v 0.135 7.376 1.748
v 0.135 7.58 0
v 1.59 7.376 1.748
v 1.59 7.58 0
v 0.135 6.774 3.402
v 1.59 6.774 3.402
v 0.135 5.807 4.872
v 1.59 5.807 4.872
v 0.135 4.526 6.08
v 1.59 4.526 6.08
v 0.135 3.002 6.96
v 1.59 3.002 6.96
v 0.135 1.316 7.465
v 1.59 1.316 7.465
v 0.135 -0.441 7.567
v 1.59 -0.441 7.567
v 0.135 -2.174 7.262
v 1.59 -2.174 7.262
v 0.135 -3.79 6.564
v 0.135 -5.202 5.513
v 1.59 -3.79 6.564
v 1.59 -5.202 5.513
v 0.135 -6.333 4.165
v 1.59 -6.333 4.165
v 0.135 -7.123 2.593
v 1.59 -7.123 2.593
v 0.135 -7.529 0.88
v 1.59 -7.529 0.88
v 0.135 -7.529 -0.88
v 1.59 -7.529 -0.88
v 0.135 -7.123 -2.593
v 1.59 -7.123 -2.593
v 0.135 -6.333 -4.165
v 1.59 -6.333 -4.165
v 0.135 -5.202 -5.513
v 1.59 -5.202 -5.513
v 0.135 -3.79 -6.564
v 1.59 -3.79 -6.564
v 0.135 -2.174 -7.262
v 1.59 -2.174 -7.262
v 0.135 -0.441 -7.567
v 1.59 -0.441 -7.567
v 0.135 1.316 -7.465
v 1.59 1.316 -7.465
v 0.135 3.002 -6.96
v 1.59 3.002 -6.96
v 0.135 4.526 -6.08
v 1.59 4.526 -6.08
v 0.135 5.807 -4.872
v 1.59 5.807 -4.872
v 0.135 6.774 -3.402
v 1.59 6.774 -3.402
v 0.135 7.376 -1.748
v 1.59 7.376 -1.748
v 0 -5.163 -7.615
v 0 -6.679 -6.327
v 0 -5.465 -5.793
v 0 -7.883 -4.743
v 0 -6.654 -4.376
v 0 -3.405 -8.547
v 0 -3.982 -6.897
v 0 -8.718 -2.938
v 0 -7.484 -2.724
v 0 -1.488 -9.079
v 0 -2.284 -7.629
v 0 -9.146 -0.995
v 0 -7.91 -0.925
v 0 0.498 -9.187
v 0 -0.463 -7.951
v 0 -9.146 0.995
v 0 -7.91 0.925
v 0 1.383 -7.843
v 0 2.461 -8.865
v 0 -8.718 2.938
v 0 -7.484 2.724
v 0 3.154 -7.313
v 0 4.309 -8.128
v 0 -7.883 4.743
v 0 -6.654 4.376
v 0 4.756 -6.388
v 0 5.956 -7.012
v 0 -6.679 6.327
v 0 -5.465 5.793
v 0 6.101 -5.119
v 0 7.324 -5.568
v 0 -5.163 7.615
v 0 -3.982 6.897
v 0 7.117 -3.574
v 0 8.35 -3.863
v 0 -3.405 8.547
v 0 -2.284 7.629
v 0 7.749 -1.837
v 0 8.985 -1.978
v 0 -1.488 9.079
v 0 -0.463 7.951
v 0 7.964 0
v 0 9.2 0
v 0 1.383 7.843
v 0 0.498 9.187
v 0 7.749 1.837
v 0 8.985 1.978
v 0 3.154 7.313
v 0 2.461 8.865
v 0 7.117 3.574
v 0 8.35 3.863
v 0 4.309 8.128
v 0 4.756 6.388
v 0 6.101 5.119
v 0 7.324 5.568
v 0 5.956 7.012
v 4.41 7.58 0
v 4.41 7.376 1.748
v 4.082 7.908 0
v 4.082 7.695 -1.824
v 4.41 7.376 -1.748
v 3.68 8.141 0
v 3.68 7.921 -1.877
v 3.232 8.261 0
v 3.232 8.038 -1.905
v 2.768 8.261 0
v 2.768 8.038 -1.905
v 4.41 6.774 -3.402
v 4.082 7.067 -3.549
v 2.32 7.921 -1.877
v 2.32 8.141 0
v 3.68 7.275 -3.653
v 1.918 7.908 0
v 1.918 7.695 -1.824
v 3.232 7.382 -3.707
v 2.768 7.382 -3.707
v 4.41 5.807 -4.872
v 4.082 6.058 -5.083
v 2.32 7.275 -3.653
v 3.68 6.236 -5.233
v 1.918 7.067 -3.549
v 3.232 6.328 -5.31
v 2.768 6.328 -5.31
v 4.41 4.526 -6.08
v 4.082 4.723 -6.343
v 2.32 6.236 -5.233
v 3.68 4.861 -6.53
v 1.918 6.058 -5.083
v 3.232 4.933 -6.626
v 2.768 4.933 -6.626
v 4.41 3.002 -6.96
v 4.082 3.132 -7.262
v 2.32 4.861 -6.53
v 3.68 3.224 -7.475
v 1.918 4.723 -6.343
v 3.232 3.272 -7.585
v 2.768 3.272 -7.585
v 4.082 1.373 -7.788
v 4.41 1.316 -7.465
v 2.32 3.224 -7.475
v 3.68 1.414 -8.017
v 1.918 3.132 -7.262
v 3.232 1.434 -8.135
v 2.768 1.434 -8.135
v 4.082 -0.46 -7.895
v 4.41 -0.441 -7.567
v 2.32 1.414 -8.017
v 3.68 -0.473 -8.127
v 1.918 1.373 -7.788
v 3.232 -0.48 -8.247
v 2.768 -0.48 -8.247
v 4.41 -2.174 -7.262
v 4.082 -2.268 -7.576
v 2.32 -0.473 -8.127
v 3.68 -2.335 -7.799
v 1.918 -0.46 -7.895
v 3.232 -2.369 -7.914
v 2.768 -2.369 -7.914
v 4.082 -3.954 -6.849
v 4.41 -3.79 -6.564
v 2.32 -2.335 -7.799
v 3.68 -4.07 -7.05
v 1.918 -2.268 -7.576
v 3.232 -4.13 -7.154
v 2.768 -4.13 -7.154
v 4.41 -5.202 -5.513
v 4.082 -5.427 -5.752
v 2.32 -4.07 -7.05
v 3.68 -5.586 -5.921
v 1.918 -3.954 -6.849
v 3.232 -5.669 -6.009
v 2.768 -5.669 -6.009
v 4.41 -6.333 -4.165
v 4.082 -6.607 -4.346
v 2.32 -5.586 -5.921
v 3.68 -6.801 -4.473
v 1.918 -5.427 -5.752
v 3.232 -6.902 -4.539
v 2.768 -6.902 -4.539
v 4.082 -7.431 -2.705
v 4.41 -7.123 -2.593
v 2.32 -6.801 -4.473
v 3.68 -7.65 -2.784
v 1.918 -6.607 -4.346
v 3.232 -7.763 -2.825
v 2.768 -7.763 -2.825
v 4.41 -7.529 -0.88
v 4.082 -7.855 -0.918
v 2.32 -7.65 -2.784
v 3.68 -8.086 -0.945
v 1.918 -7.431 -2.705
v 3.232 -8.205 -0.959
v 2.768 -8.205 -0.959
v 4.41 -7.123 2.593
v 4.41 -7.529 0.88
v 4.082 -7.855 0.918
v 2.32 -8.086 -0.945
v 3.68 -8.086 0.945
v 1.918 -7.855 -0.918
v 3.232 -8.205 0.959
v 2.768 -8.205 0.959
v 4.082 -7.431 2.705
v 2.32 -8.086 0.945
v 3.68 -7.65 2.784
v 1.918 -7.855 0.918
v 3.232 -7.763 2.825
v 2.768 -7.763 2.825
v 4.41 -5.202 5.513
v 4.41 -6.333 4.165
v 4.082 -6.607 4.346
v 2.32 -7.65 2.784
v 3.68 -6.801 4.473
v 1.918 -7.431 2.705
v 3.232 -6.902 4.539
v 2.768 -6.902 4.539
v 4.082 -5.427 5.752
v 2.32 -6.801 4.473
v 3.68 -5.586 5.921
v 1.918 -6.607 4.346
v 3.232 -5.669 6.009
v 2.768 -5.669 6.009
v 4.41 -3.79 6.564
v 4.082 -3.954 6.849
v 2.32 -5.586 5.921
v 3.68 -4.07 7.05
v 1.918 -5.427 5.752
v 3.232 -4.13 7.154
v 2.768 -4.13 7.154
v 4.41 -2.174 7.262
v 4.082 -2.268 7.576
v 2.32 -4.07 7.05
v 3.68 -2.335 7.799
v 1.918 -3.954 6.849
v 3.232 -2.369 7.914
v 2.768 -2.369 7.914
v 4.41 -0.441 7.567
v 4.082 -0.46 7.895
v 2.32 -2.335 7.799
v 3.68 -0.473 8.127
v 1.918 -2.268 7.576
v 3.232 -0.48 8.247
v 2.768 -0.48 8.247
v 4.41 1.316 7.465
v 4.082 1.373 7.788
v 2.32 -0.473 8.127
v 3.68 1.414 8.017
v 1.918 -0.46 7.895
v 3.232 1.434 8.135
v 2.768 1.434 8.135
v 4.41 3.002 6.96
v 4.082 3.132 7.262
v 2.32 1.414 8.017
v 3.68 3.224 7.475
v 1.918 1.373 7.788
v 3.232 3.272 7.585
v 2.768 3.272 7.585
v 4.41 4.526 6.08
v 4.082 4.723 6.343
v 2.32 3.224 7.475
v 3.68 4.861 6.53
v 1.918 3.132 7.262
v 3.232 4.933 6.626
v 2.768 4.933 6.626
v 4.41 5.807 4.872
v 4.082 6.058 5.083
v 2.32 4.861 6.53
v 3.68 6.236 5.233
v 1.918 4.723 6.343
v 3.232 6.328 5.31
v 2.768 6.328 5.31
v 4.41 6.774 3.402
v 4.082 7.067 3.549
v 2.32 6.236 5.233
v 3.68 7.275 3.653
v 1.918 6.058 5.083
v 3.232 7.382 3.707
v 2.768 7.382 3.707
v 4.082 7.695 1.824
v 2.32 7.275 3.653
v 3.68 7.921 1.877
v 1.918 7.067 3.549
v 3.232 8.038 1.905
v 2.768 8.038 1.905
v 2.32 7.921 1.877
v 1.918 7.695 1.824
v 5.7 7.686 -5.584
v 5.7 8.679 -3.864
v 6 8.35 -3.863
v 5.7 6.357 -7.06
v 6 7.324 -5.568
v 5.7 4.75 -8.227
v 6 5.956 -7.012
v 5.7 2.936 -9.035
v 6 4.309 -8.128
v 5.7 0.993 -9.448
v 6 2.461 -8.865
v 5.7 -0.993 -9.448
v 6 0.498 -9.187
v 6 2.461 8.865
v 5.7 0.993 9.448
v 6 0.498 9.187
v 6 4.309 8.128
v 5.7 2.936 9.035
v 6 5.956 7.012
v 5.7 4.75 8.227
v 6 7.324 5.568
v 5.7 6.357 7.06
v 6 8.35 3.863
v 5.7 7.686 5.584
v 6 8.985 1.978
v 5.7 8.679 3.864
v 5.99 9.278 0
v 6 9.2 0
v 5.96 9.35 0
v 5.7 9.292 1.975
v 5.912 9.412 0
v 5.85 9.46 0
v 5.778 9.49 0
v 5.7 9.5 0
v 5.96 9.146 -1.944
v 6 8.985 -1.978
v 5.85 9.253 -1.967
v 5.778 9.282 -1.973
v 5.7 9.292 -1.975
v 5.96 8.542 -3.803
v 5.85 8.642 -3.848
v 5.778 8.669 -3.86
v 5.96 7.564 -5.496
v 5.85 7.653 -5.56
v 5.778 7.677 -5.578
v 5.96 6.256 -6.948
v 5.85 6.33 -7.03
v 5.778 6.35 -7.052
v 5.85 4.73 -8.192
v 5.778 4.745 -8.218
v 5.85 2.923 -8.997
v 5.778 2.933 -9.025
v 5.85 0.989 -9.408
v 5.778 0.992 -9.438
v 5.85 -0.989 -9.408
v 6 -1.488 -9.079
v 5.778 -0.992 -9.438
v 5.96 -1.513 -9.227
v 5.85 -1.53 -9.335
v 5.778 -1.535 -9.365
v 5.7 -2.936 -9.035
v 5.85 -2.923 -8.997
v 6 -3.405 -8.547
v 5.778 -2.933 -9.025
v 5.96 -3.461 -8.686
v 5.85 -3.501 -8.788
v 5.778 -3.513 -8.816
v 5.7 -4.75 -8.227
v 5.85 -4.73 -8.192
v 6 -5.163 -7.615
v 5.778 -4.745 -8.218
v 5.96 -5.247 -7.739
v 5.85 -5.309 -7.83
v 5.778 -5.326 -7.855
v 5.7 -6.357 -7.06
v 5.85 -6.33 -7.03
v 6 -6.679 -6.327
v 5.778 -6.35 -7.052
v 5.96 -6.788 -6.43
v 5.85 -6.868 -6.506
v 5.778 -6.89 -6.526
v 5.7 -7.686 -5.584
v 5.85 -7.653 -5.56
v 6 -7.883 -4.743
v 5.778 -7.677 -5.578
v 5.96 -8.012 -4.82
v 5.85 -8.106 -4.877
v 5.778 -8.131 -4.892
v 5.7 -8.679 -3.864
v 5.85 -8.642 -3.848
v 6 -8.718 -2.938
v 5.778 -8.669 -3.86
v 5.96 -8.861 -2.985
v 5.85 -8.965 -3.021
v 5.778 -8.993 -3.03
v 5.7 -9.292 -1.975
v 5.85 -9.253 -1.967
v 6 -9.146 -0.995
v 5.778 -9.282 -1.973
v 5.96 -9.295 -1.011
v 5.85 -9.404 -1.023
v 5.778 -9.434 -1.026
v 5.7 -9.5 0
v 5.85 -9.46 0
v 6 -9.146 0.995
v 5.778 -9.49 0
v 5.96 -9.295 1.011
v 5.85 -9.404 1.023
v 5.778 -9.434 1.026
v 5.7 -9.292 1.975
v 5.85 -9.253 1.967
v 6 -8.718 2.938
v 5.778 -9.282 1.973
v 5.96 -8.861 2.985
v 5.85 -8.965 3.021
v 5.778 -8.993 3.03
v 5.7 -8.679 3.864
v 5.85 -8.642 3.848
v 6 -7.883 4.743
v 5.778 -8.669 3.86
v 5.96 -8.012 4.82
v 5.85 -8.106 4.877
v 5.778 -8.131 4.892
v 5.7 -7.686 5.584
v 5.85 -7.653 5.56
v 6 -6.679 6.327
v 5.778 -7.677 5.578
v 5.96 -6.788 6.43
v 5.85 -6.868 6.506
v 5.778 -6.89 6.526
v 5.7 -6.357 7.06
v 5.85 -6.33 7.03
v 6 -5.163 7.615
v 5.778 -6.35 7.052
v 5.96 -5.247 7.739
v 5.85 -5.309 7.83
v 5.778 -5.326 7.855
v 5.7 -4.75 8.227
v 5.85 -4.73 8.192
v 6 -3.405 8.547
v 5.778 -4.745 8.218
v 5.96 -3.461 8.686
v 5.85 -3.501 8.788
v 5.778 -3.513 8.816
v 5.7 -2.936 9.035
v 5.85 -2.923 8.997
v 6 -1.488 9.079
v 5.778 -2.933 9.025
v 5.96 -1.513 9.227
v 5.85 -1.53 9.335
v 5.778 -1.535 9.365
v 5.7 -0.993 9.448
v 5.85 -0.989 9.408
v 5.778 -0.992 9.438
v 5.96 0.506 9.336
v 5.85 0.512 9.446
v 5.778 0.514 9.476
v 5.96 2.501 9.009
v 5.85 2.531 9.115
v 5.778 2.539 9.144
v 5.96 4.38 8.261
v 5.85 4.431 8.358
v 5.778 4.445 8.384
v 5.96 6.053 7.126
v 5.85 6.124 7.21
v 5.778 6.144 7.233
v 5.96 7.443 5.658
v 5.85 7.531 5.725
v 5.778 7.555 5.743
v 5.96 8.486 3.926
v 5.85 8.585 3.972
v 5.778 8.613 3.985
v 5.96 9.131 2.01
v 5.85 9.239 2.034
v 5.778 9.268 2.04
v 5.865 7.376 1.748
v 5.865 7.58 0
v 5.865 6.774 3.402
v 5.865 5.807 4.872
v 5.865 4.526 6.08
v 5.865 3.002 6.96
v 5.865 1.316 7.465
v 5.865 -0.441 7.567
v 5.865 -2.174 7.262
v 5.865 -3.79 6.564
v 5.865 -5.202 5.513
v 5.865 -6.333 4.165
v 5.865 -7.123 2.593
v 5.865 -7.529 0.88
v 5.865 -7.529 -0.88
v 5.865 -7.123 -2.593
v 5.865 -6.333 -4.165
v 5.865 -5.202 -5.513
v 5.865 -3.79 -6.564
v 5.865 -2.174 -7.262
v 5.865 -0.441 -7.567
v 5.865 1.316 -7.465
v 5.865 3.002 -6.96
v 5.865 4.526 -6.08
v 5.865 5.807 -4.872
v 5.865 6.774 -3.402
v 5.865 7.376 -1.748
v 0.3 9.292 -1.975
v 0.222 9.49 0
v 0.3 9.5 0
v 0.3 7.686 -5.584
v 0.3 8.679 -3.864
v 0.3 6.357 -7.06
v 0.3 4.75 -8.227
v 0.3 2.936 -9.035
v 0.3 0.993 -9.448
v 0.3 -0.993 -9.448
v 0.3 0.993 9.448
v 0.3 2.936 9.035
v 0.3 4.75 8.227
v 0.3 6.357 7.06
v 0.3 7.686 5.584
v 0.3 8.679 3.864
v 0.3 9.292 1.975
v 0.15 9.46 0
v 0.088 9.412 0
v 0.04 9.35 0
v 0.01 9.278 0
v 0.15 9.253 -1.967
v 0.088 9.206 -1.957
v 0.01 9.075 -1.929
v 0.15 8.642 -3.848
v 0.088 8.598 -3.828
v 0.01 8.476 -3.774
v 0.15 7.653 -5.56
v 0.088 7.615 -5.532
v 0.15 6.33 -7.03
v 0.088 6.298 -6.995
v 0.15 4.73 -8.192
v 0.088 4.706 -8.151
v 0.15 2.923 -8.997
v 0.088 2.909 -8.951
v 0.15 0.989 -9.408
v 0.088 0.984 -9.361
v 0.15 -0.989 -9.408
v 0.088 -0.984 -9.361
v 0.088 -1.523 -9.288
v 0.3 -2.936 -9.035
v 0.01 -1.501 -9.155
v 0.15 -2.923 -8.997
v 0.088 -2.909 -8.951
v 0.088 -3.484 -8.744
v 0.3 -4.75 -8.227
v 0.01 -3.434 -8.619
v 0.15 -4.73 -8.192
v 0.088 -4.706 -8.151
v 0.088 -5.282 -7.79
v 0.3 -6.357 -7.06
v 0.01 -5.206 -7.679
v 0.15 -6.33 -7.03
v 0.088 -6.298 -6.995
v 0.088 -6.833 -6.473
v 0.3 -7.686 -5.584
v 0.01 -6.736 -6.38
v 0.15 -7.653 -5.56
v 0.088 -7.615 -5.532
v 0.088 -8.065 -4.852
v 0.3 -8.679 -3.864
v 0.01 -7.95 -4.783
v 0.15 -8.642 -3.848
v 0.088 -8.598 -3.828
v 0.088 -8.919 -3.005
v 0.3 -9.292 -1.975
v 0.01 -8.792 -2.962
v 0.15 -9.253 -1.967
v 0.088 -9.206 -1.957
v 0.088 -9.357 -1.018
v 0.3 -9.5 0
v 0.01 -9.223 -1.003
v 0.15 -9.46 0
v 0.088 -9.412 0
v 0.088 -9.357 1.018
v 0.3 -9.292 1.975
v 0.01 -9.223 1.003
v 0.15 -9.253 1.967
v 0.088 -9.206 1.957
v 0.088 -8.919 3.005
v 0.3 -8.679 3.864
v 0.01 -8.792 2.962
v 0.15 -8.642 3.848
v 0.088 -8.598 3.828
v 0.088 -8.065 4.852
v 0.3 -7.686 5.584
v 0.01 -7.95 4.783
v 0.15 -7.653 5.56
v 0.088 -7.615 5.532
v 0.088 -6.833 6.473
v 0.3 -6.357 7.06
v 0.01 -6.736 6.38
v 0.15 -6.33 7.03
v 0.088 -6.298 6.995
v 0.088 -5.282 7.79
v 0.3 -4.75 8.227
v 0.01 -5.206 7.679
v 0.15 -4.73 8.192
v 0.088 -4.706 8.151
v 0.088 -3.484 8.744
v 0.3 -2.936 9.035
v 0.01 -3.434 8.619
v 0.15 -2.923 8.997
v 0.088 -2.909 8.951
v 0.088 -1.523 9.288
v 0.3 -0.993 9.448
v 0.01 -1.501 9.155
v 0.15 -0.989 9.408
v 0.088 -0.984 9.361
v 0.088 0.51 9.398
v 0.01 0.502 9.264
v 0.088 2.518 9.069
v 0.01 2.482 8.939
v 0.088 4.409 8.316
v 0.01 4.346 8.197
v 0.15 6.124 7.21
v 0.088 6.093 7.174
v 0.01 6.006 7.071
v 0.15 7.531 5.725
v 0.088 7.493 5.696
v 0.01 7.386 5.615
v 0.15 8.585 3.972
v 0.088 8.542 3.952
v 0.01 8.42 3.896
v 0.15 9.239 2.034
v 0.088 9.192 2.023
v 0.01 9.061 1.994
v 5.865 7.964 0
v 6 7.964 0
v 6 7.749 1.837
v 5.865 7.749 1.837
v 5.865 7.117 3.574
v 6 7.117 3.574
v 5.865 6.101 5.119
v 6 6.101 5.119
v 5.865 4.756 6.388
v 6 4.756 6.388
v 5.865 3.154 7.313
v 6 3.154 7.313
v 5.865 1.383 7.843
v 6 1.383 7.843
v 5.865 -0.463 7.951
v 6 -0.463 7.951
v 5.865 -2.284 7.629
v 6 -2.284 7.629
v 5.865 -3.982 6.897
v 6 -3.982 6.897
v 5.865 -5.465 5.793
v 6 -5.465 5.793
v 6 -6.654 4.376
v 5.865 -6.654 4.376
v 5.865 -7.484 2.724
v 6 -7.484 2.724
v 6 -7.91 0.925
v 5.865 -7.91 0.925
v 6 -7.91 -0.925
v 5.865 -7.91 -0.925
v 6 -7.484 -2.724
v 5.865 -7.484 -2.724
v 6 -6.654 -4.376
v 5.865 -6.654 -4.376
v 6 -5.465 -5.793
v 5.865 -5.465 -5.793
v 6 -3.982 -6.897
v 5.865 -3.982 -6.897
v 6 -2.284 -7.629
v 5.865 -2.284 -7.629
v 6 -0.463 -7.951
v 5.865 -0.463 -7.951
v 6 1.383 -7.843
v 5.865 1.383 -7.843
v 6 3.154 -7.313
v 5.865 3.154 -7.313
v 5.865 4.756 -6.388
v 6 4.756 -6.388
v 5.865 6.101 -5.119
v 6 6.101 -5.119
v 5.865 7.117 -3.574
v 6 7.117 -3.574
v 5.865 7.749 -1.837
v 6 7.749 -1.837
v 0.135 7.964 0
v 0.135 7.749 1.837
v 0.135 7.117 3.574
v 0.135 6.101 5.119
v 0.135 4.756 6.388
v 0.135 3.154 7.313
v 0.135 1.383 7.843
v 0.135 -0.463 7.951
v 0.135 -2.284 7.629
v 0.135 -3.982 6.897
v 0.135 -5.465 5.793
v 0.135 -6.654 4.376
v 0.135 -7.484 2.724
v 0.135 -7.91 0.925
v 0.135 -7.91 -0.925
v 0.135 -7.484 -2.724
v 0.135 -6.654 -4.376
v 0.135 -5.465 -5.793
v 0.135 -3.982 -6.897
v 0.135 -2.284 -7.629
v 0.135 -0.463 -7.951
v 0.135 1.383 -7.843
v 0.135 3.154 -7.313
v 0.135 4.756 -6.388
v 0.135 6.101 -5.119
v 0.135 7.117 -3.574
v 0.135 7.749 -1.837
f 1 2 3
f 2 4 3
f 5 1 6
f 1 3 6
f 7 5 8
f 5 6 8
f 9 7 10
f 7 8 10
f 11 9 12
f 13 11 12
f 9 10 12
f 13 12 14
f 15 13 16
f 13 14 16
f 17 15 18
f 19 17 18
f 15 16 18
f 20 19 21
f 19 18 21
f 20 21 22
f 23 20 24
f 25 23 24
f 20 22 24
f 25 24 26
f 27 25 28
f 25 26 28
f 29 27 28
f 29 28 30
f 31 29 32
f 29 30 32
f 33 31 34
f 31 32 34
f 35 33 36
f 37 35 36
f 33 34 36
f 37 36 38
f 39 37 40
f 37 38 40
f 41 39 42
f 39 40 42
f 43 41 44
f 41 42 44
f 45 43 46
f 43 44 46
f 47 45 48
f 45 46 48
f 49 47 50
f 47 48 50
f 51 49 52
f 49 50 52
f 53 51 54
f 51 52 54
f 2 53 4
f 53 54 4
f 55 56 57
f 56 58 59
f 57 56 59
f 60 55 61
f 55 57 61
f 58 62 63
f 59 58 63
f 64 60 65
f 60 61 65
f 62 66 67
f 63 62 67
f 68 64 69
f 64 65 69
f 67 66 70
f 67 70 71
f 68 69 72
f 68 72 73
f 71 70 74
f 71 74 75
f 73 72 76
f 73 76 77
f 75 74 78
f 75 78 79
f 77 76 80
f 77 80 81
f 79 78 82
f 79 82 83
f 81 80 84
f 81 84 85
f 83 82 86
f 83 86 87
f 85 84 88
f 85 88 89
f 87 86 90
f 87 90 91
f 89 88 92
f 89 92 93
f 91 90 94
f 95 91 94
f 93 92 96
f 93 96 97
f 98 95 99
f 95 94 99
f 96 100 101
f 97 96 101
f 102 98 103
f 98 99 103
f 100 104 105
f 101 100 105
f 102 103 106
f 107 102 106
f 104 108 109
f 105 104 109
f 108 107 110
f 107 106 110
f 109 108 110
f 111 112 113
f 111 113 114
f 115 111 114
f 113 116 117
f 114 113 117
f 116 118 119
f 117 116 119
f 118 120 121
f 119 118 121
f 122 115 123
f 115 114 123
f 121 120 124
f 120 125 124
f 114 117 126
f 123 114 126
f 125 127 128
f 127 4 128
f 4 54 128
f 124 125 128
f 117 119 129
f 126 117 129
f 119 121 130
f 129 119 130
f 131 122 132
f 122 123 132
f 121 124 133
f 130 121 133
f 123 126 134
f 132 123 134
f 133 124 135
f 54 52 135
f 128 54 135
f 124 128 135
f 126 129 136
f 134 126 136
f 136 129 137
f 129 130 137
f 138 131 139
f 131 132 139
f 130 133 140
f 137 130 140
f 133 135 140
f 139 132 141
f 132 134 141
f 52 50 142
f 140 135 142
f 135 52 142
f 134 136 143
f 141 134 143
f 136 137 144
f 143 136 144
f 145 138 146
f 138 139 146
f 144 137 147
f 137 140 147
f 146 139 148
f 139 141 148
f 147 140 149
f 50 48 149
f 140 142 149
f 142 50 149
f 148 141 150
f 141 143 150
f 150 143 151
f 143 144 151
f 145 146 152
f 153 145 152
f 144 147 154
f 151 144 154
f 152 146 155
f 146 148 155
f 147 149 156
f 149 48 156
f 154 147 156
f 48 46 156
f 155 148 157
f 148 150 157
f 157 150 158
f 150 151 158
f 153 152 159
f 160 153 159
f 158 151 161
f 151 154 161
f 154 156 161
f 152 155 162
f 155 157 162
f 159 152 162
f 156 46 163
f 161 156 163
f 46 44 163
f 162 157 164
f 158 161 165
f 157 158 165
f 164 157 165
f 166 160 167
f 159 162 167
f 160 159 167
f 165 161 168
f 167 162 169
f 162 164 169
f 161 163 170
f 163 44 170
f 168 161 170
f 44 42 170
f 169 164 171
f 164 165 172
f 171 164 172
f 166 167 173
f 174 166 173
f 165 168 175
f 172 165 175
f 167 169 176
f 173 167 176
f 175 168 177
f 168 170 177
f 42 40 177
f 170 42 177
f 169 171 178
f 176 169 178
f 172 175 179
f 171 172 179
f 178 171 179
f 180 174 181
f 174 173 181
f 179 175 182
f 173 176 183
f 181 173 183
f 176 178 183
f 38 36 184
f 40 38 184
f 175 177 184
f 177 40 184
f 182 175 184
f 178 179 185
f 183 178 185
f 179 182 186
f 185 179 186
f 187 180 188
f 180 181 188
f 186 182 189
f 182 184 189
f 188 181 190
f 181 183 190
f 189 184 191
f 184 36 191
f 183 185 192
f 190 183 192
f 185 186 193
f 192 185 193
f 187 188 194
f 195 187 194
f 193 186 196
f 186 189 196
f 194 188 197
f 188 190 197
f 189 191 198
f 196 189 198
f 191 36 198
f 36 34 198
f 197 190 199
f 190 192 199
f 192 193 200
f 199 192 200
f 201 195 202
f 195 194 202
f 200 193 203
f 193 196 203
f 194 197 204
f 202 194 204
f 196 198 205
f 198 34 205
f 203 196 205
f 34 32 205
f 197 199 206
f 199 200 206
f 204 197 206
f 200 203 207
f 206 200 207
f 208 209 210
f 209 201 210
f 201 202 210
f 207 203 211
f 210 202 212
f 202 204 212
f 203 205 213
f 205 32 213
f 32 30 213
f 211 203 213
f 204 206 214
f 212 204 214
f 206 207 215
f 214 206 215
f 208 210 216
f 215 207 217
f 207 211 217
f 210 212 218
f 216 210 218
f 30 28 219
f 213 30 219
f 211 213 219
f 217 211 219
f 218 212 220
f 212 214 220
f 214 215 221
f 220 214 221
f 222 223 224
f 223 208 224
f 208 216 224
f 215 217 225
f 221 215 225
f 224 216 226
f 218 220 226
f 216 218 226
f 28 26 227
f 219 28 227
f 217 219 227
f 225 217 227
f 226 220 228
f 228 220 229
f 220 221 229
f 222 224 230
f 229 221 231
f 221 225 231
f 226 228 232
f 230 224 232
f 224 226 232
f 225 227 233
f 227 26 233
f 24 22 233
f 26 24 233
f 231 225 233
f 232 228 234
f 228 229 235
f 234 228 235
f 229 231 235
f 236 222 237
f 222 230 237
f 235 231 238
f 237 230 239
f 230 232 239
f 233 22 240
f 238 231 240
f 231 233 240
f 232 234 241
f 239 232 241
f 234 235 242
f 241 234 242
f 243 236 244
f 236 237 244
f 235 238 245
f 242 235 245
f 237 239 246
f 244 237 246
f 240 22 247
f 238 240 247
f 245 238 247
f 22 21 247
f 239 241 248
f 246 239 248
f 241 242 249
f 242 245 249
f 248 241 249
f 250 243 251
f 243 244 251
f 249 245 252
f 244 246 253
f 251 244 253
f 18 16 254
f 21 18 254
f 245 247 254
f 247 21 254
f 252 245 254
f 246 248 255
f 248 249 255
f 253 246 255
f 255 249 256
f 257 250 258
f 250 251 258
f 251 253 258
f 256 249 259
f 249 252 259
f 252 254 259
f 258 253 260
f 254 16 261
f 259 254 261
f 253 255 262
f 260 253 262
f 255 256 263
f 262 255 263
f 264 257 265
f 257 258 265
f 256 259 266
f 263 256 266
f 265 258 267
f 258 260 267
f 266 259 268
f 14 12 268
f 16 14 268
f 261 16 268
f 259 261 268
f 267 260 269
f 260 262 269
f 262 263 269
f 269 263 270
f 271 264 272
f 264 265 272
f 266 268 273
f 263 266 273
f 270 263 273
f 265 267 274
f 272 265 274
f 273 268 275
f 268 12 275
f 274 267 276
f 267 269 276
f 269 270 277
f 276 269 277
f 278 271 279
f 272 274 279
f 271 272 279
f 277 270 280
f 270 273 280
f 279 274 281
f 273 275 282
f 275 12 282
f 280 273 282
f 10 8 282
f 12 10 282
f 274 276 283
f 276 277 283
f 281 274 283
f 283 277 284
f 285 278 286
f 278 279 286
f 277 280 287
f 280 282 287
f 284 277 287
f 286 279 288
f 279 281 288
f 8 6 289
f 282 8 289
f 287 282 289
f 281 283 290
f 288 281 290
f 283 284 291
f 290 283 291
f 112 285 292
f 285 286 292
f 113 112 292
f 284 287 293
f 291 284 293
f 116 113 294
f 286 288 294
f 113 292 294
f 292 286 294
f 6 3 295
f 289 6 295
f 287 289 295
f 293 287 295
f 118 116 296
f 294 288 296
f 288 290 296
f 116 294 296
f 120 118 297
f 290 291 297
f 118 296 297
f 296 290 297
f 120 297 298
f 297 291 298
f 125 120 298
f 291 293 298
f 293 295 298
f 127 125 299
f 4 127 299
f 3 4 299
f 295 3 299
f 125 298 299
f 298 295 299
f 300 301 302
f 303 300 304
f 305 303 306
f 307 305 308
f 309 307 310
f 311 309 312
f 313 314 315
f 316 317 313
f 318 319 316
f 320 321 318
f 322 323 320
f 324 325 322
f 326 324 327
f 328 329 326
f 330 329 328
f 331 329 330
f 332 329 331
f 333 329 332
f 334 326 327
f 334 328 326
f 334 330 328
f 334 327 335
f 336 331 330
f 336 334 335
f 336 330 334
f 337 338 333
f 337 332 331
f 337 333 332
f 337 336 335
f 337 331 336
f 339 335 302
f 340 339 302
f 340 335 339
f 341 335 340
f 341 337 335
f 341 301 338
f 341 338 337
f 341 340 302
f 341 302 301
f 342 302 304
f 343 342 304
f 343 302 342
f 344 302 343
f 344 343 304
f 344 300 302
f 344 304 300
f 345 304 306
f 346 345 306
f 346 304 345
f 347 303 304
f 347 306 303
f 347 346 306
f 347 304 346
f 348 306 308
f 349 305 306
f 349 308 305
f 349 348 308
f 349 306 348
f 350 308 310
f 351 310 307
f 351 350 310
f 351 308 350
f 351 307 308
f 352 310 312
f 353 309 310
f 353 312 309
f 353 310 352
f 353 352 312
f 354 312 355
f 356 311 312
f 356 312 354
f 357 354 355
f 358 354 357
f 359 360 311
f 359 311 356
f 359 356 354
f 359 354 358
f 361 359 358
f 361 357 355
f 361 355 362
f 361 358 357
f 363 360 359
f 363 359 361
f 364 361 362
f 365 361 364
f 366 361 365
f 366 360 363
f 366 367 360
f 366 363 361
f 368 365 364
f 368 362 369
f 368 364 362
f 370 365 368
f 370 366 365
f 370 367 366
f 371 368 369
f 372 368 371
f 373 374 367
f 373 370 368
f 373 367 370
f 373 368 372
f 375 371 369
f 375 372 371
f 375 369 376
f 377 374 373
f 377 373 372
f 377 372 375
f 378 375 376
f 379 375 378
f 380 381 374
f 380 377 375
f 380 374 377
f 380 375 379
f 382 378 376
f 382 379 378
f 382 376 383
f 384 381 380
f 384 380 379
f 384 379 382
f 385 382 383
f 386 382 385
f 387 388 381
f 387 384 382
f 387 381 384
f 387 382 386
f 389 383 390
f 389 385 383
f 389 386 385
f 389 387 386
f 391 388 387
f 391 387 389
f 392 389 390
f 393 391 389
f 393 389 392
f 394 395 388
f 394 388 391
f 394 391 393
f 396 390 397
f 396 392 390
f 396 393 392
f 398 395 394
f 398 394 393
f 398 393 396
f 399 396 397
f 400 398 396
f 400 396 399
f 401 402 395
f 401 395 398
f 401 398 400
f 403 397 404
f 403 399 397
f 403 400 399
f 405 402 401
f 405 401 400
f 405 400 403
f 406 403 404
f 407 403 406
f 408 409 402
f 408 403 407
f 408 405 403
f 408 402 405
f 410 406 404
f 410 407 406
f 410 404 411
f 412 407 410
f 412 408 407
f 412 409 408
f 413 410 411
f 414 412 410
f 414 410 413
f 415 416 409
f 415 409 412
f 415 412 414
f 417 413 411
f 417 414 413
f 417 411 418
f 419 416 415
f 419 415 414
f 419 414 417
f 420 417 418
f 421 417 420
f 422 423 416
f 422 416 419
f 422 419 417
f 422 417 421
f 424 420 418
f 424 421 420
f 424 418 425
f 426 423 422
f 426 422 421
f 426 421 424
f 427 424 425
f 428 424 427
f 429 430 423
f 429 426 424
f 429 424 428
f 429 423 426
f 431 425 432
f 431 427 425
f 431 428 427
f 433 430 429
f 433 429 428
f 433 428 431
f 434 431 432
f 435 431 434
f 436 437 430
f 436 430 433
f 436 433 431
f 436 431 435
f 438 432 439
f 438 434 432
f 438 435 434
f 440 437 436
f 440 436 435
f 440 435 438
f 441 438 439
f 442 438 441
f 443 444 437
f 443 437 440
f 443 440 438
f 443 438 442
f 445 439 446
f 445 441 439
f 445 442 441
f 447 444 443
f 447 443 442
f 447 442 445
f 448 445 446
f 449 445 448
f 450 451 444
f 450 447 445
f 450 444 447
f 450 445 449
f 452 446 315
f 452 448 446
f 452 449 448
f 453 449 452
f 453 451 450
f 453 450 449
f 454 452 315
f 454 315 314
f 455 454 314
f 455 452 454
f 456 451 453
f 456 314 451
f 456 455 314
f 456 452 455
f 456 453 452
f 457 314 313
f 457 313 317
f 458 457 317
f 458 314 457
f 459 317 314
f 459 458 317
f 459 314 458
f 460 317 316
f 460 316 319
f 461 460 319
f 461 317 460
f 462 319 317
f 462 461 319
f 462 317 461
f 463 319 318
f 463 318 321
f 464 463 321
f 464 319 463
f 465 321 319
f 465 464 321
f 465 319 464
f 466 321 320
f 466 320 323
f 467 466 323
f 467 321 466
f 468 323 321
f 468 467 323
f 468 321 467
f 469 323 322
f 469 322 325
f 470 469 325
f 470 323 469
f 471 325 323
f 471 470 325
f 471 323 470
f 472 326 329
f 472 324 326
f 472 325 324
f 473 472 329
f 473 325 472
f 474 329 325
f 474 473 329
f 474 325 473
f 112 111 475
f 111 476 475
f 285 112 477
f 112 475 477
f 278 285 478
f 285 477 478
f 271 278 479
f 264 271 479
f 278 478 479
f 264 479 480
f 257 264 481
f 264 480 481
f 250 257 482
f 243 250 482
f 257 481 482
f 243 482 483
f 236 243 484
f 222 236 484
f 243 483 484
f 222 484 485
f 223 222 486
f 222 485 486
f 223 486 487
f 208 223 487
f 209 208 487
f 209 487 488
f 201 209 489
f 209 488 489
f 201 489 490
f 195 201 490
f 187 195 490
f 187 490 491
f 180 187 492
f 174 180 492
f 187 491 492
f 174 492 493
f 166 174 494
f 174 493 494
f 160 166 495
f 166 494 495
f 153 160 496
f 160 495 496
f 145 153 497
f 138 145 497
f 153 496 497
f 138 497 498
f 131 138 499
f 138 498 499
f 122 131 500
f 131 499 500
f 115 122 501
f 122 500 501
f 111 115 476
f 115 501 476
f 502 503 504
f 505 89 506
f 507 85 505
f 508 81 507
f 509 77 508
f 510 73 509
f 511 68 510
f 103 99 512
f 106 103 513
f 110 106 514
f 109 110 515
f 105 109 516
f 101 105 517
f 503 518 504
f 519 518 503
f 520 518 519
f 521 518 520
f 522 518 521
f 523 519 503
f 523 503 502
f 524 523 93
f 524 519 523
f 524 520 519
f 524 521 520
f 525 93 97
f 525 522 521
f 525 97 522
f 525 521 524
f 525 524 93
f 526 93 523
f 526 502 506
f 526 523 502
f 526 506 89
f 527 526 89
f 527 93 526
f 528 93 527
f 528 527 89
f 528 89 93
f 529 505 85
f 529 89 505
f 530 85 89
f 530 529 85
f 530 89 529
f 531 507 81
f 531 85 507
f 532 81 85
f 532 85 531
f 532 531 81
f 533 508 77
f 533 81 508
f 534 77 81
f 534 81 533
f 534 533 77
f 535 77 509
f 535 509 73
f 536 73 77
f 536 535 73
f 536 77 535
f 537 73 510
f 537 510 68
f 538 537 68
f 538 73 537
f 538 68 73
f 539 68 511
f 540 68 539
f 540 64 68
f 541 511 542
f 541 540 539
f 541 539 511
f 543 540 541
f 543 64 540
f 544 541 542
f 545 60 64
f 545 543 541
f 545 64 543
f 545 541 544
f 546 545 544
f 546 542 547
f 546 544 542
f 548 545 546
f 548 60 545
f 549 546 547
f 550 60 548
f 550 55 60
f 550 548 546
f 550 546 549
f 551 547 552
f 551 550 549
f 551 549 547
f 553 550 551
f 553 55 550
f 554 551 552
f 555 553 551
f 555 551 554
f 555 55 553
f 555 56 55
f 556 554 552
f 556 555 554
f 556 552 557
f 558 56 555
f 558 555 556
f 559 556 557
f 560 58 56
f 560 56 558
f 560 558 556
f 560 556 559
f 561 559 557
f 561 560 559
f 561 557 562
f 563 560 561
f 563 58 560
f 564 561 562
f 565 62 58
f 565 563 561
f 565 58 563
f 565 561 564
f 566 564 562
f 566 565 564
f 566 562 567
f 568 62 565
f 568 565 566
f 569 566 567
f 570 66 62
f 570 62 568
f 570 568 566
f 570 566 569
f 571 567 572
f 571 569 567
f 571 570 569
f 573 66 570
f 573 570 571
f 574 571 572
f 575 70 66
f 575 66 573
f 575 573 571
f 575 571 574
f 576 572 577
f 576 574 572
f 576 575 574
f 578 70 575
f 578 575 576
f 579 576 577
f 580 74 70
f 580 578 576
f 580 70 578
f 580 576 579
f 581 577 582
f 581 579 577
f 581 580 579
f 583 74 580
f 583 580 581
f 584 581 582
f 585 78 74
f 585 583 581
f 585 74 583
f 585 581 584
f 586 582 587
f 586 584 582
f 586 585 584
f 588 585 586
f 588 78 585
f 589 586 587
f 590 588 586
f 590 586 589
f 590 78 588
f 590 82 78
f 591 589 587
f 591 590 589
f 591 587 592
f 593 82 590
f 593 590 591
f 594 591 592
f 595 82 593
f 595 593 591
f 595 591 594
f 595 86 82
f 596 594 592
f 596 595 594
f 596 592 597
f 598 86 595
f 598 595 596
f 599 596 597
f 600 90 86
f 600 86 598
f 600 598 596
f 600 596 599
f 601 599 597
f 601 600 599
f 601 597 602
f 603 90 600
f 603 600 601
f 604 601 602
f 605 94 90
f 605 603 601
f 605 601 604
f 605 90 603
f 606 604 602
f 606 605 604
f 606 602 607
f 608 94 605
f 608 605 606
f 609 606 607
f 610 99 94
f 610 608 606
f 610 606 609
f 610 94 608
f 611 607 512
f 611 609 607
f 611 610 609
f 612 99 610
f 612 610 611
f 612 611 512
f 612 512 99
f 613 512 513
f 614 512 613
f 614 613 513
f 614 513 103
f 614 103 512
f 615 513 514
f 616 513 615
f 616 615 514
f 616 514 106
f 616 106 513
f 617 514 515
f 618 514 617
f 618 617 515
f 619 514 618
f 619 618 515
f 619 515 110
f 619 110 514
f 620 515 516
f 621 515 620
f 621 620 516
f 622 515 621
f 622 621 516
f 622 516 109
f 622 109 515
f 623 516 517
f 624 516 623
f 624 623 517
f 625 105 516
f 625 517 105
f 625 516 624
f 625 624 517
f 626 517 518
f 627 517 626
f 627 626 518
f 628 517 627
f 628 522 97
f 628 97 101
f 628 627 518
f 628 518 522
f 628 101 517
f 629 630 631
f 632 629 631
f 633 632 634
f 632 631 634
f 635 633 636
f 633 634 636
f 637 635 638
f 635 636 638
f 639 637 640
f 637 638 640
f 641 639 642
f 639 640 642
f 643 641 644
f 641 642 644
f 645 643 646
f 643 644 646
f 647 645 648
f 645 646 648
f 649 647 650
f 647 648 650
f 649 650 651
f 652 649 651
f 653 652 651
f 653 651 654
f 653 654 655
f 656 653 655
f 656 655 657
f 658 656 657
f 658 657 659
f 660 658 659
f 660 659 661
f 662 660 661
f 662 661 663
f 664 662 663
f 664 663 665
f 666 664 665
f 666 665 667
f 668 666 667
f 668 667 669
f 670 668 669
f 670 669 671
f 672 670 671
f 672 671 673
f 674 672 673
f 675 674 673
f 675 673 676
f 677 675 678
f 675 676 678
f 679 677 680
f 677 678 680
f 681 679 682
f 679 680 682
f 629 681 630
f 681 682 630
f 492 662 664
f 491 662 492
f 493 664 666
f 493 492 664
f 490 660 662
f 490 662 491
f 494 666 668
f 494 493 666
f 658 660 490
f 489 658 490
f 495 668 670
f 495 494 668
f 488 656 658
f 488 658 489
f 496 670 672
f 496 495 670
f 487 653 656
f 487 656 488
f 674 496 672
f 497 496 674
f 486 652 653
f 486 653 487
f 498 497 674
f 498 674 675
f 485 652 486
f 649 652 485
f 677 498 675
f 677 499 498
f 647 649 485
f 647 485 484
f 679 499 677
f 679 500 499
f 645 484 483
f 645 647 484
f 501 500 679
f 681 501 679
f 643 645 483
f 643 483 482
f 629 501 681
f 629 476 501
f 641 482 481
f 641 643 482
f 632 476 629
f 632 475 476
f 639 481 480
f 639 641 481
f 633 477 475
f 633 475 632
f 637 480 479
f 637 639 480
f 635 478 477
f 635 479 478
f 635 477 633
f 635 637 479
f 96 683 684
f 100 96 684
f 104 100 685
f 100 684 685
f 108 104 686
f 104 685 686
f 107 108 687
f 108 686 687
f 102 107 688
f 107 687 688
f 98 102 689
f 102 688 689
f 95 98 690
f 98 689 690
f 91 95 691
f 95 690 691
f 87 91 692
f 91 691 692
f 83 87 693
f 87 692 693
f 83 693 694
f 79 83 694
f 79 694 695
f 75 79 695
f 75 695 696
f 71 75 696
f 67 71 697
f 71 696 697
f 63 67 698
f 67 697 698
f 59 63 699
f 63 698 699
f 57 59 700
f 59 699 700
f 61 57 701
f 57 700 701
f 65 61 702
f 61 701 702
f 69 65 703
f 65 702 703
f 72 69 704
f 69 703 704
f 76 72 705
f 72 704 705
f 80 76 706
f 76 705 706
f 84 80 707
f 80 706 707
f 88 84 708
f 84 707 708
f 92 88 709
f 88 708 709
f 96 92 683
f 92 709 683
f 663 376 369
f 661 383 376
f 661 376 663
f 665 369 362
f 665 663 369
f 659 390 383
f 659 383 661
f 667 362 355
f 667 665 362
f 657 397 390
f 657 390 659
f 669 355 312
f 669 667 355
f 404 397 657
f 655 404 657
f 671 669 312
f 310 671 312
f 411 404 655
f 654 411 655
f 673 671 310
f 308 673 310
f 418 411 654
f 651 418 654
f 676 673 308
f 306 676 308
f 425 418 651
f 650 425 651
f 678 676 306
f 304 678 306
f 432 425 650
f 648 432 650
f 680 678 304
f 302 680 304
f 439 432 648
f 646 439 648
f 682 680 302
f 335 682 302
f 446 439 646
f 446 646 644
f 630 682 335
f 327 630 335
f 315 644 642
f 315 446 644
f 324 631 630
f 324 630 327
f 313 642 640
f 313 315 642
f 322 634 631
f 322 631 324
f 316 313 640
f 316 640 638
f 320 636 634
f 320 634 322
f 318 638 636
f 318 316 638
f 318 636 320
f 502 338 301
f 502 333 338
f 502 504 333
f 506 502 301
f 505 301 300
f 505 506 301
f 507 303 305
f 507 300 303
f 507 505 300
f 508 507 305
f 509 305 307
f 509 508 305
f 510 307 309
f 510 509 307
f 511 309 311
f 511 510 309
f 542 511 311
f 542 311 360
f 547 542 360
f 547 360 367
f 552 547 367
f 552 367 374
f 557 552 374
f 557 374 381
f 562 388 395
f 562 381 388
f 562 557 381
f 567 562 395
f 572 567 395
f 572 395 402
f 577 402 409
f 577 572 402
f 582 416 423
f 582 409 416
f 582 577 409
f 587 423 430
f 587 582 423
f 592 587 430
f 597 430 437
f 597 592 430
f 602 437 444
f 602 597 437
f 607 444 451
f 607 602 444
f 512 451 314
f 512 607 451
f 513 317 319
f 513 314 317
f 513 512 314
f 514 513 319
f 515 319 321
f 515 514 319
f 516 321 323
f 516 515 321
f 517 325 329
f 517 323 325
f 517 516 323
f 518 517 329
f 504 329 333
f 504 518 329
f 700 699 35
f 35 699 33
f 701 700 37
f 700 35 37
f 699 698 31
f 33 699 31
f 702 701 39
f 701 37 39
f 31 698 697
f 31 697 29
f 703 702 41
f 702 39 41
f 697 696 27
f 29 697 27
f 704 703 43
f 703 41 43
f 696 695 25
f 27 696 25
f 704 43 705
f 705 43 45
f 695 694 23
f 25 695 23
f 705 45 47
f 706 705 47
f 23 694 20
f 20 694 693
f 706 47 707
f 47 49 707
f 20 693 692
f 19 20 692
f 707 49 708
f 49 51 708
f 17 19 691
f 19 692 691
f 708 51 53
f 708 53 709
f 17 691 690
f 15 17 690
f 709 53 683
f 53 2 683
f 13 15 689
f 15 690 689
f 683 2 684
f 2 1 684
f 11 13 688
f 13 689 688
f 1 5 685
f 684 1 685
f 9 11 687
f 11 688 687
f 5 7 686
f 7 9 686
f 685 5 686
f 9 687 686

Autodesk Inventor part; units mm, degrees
sketch "Sketch_3" plane through (0, 0, 0) normal (0, 0, 1) x (1, 0, 0)
  line L0 (6, 0) -> (0, 0)
  line L1 (0, 7.964) -> (0.135, 7.964)
  line L2 (0.135, 7.964) -> (0.135, 7.58)
  line L3 (0.135, 7.58) -> (1.5901, 7.58)
  arc A0 (4.4099, 7.58) -> (1.5901, 7.58) centre (3, 6.5) ccw
  line L4 (4.4099, 7.58) -> (5.865, 7.58)
  line L5 (5.865, 7.58) -> (5.865, 7.964)
  line L6 (5.865, 7.964) -> (6, 7.964)
  line L7 (6, 7.964) -> (6, 9.2)
  arc A1 (6, 9.2) -> (5.7, 9.5) centre (5.7, 9.2) ccw
  line L8 (5.7, 9.5) -> (0.3, 9.5)
  arc A2 (0.3, 9.5) -> (0, 9.2) centre (0.3, 9.2) ccw
  line L9 (0, 9.2) -> (0, 7.964)
revolve "Revolution1" add sketch "Sketch_3" angle 360 about axis through (6, 0, 0) along (1, 0, 0)
ref_plane "mss_or_XY" through (0, 0, 0) normal (1, 0, 0) x (0, 0, -1)
ref_plane "mss_or_YZ" through (0, 0, 0) normal (0, 0, -1) x (0, 1, 0)
ref_plane "mss_or_ZX" through (0, 0, 0) normal (0, 1, 0) x (1, 0, 0)
ref_plane "mss_or11_XY" through (6, 0, 0) normal (1, 0, 0) x (0, 0, -1)
ref_plane "mss_or11_YZ" through (6, 0, 0) normal (0, 0, -1) x (0, 1, 0)
ref_plane "mss_or11_ZX" through (6, 0, 0) normal (0, 1, 0) x (1, 0, 0)
ref_plane "mss_or2_1_XY" through (3, 6.5, 0) normal (1, 0, 0) x (0, 0, -1)
ref_plane "mss_or2_1_YZ" through (3, 6.5, 0) normal (0, 0, -1) x (0, 1, 0)
ref_plane "mss_or2_1_ZX" through (3, 6.5, 0) normal (0, 1, 0) x (1, 0, 0)
ref_plane "mss_or2_2_XY" through (3, 4.0527, 5.0819) normal (1, 0, 0) x (0, 0, -1)
ref_plane "mss_or2_2_YZ" through (3, 4.0527, 5.0819) normal (0, 0, -1) x (0, 1, 0)
ref_plane "mss_or2_2_ZX" through (3, 4.0527, 5.0819) normal (0, 1, 0) x (1, 0, 0)
ref_plane "mss_or2_3_XY" through (3, -1.4464, 6.337) normal (1, 0, 0) x (0, 0, -1)
ref_plane "mss_or2_3_YZ" through (3, -1.4464, 6.337) normal (0, 0, -1) x (0, 1, 0)
ref_plane "mss_or2_3_ZX" through (3, -1.4464, 6.337) normal (0, 1, 0) x (1, 0, 0)
ref_plane "mss_or2_4_XY" through (3, -5.8563, 2.8202) normal (1, 0, 0) x (0, 0, -1)
ref_plane "mss_or2_4_YZ" through (3, -5.8563, 2.8202) normal (0, 0, -1) x (0, 1, 0)
ref_plane "mss_or2_4_ZX" through (3, -5.8563, 2.8202) normal (0, 1, 0) x (1, 0, 0)
ref_plane "mss_or2_5_XY" through (3, -5.8563, -2.8202) normal (1, 0, 0) x (0, 0, -1)
ref_plane "mss_or2_5_YZ" through (3, -5.8563, -2.8202) normal (0, 0, -1) x (0, 1, 0)
ref_plane "mss_or2_5_ZX" through (3, -5.8563, -2.8202) normal (0, 1, 0) x (1, 0, 0)
ref_plane "mss_or2_6_XY" through (3, -1.4464, -6.337) normal (1, 0, 0) x (0, 0, -1)
ref_plane "mss_or2_6_YZ" through (3, -1.4464, -6.337) normal (0, 0, -1) x (0, 1, 0)
ref_plane "mss_or2_6_ZX" through (3, -1.4464, -6.337) normal (0, 1, 0) x (1, 0, 0)
ref_plane "mss_or2_7_XY" through (3, 4.0527, -5.0819) normal (1, 0, 0) x (0, 0, -1)
ref_plane "mss_or2_7_YZ" through (3, 4.0527, -5.0819) normal (0, 0, -1) x (0, 1, 0)
ref_plane "mss_or2_7_ZX" through (3, 4.0527, -5.0819) normal (0, 1, 0) x (1, 0, 0)
ref_plane "mss_or21_1_XY" through (3, 6.5, 0) normal (1, 0, 0) x (0, 0, -1)
ref_plane "mss_or21_1_YZ" through (3, 6.5, 0) normal (0, 0, -1) x (0, 1, 0)
ref_plane "mss_or21_1_ZX" through (3, 6.5, 0) normal (0, 1, 0) x (1, 0, 0)
ref_plane "mss_or21_2_XY" through (3, 4.0527, 5.0819) normal (1, 0, 0) x (0, 0, -1)
ref_plane "mss_or21_2_YZ" through (3, 4.0527, 5.0819) normal (0, 0, -1) x (0, 1, 0)
ref_plane "mss_or21_2_ZX" through (3, 4.0527, 5.0819) normal (0, 1, 0) x (1, 0, 0)
ref_plane "mss_or21_3_XY" through (3, -1.4464, 6.337) normal (1, 0, 0) x (0, 0, -1)
ref_plane "mss_or21_3_YZ" through (3, -1.4464, 6.337) normal (0, 0, -1) x (0, 1, 0)
ref_plane "mss_or21_3_ZX" through (3, -1.4464, 6.337) normal (0, 1, 0) x (1, 0, 0)
ref_plane "mss_or21_4_XY" through (3, -5.8563, 2.8202) normal (1, 0, 0) x (0, 0, -1)
ref_plane "mss_or21_4_YZ" through (3, -5.8563, 2.8202) normal (0, 0, -1) x (0, 1, 0)
ref_plane "mss_or21_4_ZX" through (3, -5.8563, 2.8202) normal (0, 1, 0) x (1, 0, 0)
ref_plane "mss_or21_5_XY" through (3, -5.8563, -2.8202) normal (1, 0, 0) x (0, 0, -1)
ref_plane "mss_or21_5_YZ" through (3, -5.8563, -2.8202) normal (0, 0, -1) x (0, 1, 0)
ref_plane "mss_or21_5_ZX" through (3, -5.8563, -2.8202) normal (0, 1, 0) x (1, 0, 0)
ref_plane "mss_or21_6_XY" through (3, -1.4464, -6.337) normal (1, 0, 0) x (0, 0, -1)
ref_plane "mss_or21_6_YZ" through (3, -1.4464, -6.337) normal (0, 0, -1) x (0, 1, 0)
ref_plane "mss_or21_6_ZX" through (3, -1.4464, -6.337) normal (0, 1, 0) x (1, 0, 0)
ref_plane "mss_or21_7_XY" through (3, 4.0527, -5.0819) normal (1, 0, 0) x (0, 0, -1)
ref_plane "mss_or21_7_YZ" through (3, 4.0527, -5.0819) normal (0, 0, -1) x (0, 1, 0)
ref_plane "mss_or21_7_ZX" through (3, 4.0527, -5.0819) normal (0, 1, 0) x (1, 0, 0)
properties part number "607ZZ Outer ring"
